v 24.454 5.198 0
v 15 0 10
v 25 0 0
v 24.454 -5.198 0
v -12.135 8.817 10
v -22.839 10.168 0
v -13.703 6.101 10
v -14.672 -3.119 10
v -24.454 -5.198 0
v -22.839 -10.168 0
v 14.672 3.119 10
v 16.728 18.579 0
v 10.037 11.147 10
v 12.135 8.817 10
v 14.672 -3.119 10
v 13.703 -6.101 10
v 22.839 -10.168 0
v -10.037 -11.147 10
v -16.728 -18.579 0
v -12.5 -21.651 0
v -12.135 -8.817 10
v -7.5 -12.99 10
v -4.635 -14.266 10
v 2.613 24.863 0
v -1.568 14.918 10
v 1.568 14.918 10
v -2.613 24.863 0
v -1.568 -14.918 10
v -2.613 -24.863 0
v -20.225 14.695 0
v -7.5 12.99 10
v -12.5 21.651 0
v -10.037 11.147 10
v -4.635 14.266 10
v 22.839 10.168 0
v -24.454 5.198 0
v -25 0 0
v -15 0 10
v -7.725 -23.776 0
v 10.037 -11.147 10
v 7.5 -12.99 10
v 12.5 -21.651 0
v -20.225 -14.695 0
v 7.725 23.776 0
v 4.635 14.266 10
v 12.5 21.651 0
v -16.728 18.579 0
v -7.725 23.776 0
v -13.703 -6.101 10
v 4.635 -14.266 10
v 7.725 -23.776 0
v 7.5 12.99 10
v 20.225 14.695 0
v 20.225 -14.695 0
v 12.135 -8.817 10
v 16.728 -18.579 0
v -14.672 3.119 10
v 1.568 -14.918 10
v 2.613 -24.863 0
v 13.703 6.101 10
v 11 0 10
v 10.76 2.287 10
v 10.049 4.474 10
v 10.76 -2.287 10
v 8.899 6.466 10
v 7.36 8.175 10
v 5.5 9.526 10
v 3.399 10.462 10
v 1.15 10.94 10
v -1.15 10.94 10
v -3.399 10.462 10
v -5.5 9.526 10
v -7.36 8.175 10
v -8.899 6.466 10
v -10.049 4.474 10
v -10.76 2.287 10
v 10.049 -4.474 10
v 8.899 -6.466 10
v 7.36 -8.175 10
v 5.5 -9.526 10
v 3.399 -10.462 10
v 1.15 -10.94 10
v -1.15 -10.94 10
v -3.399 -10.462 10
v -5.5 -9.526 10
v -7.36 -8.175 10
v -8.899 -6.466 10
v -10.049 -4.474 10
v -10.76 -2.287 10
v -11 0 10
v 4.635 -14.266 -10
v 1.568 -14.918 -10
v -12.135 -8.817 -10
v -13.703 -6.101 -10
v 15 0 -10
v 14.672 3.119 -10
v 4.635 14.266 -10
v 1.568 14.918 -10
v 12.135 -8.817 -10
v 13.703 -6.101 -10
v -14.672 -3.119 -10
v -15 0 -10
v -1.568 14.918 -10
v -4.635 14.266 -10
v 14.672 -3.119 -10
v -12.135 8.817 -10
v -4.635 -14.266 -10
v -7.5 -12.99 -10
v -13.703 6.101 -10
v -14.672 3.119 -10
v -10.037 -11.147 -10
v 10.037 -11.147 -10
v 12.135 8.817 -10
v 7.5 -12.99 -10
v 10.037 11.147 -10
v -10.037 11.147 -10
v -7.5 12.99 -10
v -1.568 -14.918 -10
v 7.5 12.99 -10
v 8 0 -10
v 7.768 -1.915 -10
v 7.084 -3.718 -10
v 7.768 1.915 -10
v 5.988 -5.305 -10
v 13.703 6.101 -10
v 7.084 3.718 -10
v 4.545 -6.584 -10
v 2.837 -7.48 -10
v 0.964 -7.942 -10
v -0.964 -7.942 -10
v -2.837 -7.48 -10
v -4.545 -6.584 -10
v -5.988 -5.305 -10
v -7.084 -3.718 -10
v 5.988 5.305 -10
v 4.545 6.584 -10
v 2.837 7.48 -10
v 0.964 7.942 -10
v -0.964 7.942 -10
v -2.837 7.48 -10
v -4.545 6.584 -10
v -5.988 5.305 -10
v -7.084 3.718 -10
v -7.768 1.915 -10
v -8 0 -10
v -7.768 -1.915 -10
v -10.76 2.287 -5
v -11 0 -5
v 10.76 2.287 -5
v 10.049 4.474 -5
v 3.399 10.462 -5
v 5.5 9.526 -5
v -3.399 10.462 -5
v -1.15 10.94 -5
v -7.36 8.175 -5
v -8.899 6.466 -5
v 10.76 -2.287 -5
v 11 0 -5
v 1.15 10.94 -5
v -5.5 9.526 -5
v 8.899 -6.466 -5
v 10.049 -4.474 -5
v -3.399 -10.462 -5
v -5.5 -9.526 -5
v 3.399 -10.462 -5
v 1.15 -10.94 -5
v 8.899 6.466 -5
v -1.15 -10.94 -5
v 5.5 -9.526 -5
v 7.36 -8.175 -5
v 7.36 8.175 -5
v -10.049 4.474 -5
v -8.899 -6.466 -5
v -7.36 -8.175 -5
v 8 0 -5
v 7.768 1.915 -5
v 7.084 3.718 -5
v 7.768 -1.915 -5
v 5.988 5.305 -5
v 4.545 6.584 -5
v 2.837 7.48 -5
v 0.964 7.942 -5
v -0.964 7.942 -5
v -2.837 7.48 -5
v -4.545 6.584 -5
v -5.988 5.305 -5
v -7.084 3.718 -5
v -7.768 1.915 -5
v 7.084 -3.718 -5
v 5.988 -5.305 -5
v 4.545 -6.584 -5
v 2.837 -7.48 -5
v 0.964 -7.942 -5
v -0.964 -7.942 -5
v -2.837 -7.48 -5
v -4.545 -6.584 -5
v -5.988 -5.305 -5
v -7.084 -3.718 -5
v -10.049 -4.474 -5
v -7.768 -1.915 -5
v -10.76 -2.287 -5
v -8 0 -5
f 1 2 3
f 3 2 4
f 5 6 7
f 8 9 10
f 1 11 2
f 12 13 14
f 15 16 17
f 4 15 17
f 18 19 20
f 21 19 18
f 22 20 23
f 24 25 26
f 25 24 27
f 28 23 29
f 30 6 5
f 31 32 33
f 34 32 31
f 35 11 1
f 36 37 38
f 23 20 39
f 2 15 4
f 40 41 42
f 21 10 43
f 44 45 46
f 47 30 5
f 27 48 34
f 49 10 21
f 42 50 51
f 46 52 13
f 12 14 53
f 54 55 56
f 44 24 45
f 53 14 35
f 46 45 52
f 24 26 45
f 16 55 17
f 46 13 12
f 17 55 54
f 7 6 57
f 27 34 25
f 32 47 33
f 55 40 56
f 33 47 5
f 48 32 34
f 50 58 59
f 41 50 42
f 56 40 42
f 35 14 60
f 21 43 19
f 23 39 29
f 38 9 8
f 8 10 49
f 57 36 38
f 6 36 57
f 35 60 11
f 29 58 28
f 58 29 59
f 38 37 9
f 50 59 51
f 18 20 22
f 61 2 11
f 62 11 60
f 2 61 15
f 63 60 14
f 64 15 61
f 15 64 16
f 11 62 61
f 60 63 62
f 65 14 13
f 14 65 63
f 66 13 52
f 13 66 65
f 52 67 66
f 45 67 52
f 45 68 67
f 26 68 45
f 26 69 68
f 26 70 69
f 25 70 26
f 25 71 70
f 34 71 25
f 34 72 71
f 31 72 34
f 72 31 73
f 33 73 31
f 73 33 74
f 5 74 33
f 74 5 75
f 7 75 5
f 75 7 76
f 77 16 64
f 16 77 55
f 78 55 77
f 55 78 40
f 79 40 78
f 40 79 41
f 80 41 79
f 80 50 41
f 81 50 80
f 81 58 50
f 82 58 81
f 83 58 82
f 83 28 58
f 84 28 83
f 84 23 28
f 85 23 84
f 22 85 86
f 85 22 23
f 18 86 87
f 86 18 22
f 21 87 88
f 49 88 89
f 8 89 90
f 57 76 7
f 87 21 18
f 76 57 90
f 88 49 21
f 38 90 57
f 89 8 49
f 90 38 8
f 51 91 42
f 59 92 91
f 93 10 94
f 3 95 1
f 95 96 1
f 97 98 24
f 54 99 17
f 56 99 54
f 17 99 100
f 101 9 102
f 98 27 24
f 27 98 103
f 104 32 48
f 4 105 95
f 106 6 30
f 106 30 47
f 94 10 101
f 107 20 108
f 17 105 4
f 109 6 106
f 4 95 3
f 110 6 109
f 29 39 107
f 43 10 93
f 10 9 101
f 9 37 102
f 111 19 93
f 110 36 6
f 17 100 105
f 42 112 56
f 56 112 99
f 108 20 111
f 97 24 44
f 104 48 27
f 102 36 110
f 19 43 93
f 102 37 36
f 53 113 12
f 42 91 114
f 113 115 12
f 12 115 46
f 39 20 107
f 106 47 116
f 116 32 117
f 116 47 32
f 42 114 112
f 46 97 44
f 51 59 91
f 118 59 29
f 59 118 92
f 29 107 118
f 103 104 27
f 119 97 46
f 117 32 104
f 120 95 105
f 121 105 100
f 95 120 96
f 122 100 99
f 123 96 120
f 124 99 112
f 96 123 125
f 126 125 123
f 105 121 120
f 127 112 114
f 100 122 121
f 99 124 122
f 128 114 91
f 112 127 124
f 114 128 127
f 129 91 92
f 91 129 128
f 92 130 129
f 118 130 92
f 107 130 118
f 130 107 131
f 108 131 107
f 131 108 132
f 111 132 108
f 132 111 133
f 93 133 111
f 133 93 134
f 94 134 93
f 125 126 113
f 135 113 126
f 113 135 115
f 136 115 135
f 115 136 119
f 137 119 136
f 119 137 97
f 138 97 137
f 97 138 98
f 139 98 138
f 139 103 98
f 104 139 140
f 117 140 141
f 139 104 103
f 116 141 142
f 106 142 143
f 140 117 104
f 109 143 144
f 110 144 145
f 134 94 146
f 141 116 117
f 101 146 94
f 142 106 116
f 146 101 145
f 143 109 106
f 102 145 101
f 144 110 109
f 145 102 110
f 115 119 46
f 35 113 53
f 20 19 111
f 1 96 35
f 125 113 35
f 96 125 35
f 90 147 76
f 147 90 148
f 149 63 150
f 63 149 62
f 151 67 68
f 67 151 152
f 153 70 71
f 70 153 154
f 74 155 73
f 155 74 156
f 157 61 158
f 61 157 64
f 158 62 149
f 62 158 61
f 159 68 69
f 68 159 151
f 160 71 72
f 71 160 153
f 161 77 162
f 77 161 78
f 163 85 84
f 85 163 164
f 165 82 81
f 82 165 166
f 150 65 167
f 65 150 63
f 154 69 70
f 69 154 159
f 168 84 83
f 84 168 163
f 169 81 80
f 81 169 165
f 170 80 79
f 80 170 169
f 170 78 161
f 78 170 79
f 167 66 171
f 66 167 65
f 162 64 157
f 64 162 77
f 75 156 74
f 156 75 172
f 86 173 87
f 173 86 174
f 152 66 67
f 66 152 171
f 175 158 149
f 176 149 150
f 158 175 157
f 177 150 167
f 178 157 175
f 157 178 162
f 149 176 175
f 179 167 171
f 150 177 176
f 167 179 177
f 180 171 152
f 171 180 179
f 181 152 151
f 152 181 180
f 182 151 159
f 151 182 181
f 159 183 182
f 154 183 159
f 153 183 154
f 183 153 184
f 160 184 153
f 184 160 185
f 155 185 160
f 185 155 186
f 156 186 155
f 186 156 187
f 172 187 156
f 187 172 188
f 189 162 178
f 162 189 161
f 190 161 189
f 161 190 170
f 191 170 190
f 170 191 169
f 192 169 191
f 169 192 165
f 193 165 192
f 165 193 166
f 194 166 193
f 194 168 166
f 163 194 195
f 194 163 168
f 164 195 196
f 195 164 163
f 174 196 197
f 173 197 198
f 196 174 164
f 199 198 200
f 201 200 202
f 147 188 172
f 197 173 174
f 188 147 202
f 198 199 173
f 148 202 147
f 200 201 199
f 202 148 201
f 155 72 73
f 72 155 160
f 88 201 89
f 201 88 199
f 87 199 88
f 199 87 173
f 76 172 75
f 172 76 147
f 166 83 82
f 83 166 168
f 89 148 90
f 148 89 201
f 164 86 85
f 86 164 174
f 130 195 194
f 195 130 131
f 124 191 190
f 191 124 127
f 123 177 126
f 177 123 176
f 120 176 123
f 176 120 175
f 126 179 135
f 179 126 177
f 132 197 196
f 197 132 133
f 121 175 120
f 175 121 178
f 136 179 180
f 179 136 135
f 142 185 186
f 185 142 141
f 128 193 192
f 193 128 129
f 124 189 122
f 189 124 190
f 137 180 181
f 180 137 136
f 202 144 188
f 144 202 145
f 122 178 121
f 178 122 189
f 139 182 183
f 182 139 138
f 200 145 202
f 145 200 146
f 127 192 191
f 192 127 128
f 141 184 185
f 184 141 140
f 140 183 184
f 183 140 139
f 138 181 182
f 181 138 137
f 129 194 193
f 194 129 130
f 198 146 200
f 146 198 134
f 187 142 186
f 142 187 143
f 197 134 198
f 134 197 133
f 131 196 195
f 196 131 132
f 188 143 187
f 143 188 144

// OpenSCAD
difference(){
	union(){
		cylinder (h = 10,  r1 = 25, r2 = 15, center = "true");
		translate([0,0,-10])cylinder (h = 10,  r1 = 15 , r2 = 25, center = "true");
		}
	translate([0, 0, -5])cylinder (h = 20, r  = 11, center = "true");
	translate([0, 0, -20])cylinder (h = 40, r = 8, center = "true");
}
